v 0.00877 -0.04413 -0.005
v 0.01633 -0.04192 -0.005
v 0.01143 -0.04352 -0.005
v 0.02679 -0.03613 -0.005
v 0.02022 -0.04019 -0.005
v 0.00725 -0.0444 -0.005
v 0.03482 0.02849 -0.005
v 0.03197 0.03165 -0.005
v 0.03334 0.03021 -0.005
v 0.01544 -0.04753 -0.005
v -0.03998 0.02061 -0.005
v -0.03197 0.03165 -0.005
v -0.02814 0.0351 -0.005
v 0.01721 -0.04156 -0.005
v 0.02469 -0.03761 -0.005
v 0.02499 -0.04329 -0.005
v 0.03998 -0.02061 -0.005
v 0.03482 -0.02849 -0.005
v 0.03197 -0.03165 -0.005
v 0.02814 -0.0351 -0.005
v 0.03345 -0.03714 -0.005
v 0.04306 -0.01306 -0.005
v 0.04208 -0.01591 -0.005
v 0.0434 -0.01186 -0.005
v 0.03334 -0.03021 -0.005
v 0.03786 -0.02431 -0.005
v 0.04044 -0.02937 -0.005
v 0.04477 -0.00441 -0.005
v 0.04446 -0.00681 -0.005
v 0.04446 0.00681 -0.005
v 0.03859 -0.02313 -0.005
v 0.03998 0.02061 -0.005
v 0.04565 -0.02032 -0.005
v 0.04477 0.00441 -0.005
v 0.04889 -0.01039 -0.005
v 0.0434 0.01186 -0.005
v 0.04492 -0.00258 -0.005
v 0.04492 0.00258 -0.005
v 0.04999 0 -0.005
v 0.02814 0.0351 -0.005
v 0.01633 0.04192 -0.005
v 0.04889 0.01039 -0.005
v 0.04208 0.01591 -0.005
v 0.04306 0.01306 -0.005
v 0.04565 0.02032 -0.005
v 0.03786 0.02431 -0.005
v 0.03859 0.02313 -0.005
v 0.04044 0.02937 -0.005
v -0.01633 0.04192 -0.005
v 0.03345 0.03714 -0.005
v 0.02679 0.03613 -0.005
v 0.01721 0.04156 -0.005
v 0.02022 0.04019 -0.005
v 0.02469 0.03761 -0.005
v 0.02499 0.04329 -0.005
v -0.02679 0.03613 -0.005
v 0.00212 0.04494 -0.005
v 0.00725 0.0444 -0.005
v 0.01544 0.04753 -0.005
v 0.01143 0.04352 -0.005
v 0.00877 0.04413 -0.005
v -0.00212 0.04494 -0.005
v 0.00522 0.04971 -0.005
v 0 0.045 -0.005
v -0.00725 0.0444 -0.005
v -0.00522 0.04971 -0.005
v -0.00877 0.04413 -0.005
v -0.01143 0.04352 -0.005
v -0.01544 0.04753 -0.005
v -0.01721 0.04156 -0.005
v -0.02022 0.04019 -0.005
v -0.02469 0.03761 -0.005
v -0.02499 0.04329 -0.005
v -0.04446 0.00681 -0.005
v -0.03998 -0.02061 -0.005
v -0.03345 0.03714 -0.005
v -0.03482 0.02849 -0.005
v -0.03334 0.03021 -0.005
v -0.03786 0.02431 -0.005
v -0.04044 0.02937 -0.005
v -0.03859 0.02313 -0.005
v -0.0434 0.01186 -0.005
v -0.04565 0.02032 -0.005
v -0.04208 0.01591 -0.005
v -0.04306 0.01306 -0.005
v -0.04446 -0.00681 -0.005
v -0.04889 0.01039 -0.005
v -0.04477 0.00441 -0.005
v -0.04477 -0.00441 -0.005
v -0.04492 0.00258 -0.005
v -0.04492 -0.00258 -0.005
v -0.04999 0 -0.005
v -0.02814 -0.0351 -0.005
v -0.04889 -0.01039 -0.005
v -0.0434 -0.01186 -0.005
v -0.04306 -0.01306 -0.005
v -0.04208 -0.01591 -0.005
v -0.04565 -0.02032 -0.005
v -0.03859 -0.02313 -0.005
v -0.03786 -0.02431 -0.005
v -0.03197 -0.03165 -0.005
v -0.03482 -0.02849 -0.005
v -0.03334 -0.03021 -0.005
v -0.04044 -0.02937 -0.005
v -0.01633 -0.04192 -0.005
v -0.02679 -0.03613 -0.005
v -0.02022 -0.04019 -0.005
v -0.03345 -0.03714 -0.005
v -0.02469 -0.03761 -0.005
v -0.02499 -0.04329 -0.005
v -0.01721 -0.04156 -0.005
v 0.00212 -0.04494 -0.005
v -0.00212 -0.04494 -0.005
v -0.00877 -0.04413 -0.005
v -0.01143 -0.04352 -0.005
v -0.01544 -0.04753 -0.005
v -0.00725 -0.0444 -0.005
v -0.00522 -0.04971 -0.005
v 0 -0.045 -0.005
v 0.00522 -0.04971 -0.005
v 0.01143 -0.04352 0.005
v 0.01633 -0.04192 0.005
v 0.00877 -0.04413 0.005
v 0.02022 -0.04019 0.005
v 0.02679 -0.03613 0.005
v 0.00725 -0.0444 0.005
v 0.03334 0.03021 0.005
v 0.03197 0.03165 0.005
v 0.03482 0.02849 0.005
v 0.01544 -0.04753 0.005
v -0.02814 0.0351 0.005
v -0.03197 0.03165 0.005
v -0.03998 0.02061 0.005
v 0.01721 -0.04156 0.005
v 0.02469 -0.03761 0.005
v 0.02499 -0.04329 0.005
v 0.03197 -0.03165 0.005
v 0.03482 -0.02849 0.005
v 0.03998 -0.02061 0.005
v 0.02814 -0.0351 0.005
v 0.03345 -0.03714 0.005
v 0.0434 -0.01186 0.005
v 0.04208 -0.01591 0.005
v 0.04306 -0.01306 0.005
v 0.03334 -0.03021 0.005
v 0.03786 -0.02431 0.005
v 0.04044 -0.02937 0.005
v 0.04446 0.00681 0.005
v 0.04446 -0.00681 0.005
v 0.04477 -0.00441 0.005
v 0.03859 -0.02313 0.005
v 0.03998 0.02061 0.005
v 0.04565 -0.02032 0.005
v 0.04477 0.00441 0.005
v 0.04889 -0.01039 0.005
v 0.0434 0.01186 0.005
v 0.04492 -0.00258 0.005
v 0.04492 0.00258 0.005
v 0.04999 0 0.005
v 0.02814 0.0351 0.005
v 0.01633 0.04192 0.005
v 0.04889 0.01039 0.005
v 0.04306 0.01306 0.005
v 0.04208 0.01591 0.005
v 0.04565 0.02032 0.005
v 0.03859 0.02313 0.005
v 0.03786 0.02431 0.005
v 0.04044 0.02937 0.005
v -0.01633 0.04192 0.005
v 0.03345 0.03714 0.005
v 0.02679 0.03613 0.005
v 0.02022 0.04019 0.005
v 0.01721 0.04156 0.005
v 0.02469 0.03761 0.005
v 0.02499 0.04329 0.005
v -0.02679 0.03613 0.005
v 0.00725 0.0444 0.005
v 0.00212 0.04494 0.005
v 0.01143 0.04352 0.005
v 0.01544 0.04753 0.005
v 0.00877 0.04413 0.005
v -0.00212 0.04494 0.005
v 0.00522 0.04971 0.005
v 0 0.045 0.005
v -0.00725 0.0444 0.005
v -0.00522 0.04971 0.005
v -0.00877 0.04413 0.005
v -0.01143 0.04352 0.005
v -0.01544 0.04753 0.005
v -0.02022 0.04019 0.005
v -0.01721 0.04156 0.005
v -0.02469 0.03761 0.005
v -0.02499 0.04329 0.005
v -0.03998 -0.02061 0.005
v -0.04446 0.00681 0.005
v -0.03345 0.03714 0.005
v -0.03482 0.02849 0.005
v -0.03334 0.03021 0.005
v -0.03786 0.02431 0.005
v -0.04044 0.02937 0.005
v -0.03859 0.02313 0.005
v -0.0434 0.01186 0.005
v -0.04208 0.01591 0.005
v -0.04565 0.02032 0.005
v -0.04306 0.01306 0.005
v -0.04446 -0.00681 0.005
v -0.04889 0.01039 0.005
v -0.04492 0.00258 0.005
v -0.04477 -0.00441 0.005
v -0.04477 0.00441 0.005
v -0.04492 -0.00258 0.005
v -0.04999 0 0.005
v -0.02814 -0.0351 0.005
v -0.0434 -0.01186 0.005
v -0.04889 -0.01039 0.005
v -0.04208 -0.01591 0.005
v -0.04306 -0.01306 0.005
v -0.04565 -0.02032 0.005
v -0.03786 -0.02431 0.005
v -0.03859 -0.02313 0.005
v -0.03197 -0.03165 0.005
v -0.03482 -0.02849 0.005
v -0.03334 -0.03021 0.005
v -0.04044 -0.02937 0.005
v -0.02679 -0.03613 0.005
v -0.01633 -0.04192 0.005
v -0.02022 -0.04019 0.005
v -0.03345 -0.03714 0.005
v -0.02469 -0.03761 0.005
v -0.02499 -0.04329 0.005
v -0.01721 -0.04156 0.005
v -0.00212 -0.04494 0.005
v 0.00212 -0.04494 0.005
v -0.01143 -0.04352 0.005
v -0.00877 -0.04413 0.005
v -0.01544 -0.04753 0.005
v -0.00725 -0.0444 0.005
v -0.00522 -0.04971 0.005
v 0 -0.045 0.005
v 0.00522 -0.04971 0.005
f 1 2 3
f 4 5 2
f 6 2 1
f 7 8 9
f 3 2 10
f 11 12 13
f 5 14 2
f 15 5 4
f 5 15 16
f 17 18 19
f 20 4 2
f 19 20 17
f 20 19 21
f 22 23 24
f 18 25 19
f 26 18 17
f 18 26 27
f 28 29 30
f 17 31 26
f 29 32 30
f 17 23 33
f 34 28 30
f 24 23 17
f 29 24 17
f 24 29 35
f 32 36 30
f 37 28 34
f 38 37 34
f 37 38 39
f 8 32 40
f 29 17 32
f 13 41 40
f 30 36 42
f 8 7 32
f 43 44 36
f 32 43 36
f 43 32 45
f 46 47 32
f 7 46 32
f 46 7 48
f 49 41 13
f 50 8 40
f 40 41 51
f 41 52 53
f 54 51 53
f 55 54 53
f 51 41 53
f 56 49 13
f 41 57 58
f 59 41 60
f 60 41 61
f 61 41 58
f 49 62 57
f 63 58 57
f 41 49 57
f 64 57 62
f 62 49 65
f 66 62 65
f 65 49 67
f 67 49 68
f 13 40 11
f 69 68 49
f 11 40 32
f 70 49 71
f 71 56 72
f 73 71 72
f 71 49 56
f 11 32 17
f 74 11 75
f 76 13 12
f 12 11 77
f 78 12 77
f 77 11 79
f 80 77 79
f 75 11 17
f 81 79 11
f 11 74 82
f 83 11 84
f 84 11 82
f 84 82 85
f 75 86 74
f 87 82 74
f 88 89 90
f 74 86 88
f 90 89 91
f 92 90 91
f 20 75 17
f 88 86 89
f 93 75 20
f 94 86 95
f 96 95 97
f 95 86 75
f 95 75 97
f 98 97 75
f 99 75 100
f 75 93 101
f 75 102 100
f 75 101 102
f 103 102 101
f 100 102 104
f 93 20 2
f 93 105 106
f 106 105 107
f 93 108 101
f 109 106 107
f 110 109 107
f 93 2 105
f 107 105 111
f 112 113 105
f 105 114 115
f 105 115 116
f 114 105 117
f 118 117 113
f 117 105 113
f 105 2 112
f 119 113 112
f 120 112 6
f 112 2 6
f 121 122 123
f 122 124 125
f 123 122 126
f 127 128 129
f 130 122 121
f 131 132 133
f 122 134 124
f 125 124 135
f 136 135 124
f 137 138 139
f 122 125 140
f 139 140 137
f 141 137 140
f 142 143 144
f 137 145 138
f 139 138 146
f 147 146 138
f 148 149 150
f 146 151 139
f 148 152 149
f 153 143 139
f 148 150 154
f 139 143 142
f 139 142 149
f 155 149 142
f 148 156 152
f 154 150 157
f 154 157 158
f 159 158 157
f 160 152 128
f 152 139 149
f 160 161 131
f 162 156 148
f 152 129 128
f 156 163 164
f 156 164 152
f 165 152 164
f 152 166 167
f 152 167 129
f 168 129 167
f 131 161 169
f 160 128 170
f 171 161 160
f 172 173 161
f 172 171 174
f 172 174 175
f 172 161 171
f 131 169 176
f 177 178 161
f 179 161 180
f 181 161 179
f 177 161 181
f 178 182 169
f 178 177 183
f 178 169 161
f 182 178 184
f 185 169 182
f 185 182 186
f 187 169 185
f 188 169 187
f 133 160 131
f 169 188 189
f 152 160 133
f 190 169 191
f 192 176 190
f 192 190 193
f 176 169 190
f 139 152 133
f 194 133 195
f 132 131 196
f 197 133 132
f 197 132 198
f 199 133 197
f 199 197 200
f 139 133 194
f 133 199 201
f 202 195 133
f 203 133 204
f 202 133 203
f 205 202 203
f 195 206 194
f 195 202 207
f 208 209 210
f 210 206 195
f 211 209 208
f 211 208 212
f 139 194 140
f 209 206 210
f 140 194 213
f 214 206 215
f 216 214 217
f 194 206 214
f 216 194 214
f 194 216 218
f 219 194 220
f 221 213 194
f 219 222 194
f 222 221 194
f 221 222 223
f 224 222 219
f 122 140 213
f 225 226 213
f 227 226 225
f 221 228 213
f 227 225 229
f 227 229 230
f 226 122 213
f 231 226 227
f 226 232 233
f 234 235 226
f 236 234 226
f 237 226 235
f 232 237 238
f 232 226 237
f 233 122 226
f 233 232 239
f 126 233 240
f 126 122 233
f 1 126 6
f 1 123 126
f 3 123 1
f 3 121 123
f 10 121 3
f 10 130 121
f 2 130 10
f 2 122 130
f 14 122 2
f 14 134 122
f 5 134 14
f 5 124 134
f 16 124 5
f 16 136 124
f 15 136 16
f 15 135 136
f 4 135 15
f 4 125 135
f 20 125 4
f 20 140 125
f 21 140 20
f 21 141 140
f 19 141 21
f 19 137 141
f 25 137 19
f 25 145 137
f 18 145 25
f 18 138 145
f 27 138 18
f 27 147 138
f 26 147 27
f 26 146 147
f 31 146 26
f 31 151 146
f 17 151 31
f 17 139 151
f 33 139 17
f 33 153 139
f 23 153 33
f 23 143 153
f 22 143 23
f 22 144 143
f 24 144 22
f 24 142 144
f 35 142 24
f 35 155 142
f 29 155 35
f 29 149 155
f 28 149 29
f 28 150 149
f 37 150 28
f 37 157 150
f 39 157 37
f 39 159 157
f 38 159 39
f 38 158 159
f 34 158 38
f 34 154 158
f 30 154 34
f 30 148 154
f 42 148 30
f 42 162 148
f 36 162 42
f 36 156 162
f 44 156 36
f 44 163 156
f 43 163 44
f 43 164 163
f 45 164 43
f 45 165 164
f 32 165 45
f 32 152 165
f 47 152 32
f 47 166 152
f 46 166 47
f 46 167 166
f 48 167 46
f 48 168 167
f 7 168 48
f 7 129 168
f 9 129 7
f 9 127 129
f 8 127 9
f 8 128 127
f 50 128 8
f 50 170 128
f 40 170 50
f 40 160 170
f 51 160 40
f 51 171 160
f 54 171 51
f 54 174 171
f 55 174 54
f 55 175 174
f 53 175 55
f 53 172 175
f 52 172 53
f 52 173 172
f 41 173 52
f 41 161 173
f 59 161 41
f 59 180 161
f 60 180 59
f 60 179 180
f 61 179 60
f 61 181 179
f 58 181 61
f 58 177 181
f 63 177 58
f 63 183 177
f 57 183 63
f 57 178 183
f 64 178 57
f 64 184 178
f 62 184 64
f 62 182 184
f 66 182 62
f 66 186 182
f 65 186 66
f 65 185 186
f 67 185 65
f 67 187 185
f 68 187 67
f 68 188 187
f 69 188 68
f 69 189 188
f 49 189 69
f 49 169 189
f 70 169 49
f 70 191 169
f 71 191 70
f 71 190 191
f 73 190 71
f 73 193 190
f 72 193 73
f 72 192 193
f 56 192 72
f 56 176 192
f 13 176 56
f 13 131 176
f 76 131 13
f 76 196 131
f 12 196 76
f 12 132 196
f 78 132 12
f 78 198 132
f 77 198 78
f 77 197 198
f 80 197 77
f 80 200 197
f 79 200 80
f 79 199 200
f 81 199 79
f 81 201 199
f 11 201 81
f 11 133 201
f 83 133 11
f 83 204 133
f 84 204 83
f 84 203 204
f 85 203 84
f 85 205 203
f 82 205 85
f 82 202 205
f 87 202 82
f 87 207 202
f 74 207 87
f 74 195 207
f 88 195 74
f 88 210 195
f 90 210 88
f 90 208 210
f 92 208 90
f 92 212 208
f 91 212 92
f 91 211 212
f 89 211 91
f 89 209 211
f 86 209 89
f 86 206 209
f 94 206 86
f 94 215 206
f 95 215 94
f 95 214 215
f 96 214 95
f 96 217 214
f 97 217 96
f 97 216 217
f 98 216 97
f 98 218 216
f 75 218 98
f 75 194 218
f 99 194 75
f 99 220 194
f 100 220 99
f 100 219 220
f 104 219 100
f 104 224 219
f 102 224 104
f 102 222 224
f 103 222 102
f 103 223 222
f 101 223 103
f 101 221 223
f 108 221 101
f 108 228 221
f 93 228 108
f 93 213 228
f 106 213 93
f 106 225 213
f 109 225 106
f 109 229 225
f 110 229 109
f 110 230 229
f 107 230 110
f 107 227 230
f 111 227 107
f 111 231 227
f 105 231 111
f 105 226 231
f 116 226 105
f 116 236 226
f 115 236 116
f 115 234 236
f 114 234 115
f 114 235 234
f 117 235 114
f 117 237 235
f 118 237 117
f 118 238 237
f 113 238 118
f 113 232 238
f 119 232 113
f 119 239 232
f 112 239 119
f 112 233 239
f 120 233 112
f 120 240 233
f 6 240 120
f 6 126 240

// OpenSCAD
$fn=128;

module tooth2d(r_root=0.045, r_tip=0.05, tooth_angle=6, gap_angle=6){
    polygon(points=[
        [r_root*cos(-gap_angle/2), r_root*sin(-gap_angle/2)],
        [r_tip*cos(0),            r_tip*sin(0)],
        [r_root*cos(gap_angle/2),  r_root*sin(gap_angle/2)]
    ]);
}

module rosette2d(r_root=0.045, r_tip=0.05, teeth=30){
    step = 360/teeth;
    gap = step*0.55;
    union(){
        circle(r=r_root);
        for(i=[0:teeth-1]){
            rotate(i*step) tooth2d(r_root=r_root, r_tip=r_tip, gap_angle=gap);
        }
    }
}

module rosette_plate(d=0.1, thickness=0.01, teeth=30){
    r_tip = d/2;
    r_root = r_tip*0.90;
    linear_extrude(height=thickness, center=true, convexity=10)
        rosette2d(r_root=r_root, r_tip=r_tip, teeth=teeth);
}

rosette_plate(d=0.1, thickness=0.01, teeth=30);
